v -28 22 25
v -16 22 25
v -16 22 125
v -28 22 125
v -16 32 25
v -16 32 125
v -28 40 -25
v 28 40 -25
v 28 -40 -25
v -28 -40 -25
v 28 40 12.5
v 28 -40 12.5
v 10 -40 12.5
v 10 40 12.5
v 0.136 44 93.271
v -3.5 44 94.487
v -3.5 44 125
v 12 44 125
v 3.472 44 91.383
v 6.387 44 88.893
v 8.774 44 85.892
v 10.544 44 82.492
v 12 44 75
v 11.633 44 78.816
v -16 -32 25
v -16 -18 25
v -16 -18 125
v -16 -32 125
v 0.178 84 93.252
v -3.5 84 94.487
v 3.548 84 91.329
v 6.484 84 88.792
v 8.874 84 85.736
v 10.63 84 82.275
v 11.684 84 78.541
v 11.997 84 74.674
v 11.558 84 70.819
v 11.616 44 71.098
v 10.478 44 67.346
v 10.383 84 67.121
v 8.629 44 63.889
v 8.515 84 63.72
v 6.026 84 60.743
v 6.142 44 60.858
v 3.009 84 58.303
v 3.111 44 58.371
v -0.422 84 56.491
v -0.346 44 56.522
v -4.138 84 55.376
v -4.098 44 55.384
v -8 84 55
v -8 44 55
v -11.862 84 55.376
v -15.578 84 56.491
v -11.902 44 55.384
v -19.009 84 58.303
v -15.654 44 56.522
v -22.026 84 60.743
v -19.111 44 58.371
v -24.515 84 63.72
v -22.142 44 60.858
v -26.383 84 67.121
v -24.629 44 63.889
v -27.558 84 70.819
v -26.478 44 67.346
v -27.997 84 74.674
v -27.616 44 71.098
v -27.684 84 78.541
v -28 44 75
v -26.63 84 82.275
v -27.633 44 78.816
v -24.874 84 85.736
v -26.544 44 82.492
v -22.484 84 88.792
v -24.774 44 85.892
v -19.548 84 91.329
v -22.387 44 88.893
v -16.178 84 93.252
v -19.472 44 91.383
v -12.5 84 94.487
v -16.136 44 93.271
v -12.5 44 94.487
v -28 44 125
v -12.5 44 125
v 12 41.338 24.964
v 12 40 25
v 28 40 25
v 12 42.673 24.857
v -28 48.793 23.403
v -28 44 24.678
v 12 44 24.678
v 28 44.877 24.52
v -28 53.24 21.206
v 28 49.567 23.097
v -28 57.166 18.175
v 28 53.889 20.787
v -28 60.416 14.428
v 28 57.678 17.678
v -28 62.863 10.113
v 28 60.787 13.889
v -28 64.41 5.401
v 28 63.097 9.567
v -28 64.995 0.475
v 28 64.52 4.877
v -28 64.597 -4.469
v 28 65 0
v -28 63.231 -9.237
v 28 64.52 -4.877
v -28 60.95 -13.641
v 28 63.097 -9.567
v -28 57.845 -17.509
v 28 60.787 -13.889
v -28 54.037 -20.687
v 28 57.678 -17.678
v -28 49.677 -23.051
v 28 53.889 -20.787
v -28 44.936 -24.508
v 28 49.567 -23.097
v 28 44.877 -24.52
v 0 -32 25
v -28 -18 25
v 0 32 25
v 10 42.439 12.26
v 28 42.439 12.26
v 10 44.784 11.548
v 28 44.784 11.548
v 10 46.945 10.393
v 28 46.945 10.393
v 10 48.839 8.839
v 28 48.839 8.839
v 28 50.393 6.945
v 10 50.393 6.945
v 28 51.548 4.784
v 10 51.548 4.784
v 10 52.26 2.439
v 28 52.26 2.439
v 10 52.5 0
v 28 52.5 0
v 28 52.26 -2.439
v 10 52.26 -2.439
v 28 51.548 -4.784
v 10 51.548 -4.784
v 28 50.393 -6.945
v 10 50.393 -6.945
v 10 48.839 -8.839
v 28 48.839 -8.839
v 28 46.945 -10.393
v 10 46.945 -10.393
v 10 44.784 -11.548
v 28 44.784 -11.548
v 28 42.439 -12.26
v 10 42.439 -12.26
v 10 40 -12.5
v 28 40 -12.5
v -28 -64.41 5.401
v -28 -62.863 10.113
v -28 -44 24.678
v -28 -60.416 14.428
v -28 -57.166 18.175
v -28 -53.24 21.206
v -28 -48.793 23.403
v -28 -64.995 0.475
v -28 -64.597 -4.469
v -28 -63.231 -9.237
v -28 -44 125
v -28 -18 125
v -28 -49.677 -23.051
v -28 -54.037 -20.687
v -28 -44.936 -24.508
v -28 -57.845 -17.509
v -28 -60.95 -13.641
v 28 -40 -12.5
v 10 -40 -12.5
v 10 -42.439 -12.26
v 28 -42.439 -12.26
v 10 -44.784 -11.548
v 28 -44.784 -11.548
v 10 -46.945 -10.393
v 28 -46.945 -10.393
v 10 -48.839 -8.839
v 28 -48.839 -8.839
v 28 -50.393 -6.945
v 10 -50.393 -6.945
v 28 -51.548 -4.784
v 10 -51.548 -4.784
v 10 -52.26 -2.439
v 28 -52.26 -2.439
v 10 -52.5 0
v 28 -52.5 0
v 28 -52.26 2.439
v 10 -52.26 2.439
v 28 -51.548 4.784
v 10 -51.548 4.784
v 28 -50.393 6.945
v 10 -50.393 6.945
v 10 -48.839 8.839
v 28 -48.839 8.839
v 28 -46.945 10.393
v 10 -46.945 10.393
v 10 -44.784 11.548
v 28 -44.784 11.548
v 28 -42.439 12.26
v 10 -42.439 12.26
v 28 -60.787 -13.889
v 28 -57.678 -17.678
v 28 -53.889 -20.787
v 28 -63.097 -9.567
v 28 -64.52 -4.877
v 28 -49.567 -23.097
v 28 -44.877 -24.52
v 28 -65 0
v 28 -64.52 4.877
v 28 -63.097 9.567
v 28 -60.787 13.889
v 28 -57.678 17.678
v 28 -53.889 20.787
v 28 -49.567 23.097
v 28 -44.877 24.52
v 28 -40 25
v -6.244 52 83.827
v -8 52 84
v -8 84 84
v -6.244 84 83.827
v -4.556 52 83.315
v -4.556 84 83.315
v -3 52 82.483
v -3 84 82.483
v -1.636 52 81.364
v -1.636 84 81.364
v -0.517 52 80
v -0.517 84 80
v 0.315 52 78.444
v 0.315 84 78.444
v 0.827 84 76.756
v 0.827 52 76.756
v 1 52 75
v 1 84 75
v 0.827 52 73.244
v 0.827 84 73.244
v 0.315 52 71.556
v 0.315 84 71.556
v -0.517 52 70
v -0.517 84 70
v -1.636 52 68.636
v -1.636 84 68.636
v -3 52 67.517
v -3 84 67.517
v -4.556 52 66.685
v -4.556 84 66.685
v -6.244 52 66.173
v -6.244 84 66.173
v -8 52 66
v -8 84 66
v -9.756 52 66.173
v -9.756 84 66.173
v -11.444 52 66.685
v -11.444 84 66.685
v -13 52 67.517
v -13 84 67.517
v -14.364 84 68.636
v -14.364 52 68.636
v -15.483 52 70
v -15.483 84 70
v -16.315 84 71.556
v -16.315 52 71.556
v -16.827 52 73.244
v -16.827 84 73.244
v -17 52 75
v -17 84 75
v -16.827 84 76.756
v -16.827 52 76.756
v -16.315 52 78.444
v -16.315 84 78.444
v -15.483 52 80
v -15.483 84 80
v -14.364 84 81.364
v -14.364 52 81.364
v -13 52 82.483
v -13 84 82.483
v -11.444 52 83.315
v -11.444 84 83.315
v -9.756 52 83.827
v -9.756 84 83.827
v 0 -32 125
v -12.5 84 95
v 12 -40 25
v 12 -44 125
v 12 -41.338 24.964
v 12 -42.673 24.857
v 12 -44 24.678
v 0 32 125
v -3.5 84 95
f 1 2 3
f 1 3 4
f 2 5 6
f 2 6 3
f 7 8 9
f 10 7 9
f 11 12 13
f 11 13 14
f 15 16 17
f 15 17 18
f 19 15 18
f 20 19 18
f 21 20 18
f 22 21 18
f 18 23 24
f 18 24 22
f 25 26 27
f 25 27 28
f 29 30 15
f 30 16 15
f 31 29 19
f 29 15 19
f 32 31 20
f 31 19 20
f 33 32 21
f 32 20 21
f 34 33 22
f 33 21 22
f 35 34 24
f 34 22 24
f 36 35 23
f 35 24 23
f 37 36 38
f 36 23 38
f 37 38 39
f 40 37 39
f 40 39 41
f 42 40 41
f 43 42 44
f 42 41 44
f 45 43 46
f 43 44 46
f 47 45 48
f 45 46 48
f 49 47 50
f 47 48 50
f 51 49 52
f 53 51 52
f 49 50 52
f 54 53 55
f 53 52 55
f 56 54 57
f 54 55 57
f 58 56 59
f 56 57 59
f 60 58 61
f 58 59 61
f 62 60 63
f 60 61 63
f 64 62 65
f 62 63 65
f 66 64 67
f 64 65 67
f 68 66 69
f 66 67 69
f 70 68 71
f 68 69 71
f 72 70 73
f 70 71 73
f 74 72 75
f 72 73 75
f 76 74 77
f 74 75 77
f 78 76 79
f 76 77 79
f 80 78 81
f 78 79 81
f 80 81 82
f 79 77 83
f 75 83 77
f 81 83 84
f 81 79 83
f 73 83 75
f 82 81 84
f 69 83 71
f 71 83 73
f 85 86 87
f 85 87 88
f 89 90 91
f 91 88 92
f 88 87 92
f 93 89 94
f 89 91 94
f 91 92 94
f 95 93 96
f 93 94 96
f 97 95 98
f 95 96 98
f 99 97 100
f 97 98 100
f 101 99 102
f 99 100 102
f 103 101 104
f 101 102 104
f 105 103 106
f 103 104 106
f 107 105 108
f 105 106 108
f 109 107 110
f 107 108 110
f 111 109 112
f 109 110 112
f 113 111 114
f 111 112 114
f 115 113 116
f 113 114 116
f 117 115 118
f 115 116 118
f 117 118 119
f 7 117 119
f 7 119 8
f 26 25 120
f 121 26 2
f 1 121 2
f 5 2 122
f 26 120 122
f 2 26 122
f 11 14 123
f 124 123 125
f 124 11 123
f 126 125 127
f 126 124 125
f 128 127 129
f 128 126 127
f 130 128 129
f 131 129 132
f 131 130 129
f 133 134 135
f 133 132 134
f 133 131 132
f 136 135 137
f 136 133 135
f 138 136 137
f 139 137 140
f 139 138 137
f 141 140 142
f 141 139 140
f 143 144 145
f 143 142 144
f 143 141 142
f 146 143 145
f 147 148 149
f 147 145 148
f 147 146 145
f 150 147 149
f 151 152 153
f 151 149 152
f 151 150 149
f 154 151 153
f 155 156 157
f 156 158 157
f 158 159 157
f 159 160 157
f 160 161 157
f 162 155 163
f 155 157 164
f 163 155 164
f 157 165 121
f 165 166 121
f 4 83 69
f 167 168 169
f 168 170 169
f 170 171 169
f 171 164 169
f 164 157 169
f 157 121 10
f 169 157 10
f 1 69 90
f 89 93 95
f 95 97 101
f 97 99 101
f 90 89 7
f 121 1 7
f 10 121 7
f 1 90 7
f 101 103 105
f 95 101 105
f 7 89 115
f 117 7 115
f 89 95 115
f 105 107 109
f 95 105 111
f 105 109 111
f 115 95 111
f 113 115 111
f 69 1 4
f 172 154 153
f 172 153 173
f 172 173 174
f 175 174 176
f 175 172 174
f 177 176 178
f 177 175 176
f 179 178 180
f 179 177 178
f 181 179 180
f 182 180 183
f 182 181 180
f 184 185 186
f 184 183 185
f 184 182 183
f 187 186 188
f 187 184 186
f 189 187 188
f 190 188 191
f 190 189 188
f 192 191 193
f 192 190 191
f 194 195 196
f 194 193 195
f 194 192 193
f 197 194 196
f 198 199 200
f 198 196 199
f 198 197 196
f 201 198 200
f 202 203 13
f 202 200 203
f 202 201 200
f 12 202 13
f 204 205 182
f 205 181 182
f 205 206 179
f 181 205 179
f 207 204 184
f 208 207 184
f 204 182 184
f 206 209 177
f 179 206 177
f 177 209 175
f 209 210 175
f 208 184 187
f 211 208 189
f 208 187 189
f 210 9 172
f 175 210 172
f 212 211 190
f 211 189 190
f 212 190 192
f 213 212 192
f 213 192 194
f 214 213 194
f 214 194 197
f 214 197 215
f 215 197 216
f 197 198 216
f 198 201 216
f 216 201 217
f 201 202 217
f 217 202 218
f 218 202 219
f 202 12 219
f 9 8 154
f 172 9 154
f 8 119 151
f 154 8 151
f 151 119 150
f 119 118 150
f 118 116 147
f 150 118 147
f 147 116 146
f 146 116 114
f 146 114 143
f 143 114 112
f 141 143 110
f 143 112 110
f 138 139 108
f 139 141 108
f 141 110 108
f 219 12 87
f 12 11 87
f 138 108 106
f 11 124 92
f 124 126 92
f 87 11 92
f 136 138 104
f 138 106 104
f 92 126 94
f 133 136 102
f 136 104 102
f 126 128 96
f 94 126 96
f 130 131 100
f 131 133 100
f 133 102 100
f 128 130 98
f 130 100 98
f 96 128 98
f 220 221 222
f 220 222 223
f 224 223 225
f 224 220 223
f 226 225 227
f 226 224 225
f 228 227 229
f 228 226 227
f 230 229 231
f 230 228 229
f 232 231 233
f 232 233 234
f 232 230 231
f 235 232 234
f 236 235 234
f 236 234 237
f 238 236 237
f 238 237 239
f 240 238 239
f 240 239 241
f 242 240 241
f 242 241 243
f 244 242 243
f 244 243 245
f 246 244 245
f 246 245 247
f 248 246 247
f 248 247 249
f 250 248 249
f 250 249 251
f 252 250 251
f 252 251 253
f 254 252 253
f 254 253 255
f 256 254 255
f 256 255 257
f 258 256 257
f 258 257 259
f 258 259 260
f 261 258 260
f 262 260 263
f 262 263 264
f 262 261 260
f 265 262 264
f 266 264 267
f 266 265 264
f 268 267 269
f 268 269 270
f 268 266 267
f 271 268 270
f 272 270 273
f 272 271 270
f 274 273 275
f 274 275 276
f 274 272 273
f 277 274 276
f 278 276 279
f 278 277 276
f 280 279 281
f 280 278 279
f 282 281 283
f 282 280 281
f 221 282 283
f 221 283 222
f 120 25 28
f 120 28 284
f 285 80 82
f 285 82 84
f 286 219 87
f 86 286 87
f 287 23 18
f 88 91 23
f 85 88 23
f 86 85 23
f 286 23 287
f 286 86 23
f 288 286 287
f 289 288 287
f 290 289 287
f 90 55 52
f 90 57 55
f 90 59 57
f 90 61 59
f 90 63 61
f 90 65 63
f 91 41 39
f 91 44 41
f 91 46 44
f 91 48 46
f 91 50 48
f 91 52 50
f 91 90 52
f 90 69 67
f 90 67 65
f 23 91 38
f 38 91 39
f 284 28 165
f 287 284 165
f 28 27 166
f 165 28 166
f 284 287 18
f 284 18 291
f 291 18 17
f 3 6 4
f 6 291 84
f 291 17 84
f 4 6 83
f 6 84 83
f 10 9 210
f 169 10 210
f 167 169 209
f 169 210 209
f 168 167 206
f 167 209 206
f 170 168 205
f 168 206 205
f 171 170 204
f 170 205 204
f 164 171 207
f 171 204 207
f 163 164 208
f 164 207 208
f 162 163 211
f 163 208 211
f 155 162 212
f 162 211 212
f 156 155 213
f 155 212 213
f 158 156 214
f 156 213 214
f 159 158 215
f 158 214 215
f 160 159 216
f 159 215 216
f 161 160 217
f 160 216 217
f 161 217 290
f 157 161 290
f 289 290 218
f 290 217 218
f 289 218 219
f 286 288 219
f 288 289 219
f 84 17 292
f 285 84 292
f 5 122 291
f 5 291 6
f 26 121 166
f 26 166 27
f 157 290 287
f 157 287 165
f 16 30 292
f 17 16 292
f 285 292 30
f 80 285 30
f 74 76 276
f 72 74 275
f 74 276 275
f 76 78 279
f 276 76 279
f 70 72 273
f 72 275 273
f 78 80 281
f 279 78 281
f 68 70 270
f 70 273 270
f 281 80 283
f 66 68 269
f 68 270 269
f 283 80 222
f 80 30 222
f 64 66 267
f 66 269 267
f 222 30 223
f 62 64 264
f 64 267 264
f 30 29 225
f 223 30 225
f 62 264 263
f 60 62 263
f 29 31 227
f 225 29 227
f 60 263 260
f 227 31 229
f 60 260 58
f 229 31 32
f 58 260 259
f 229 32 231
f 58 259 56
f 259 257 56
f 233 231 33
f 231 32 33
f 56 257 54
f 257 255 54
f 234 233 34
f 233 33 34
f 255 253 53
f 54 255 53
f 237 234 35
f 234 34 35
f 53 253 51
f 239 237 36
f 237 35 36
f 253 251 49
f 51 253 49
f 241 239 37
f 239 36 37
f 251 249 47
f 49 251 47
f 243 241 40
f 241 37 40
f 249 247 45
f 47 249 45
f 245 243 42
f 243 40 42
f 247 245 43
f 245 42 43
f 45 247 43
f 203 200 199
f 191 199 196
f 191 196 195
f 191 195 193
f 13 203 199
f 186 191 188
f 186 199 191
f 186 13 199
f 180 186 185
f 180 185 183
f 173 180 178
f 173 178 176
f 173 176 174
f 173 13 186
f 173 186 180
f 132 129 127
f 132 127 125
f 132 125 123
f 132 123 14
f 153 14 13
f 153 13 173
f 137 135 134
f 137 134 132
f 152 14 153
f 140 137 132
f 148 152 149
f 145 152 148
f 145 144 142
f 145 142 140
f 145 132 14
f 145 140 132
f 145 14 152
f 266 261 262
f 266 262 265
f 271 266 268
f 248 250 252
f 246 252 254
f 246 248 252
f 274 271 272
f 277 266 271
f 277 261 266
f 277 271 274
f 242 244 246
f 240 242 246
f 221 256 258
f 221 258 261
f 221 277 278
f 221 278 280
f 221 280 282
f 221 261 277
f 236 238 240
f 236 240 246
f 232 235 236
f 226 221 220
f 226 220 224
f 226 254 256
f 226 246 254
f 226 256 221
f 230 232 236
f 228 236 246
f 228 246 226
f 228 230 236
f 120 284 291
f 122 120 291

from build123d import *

# Parameters (mm, degrees)
BOSS_EXTRUDE1_DEPTH      = 28
BOSS_EXTRUDE2_DEPTH      = 10
BOSS_EXTRUDE2_DEPTH_BACK = 28
BOSS_EXTRUDE3_DEPTH      = 100
BOSS_EXTRUDE3_DEPTH_BACK = 4
SKETCH4_R                = 20
SKETCH4_R_2              = 9
BOSS_EXTRUDE4_DEPTH      = 40
SKETCH4_2_R              = 9
BOSS_EXTRUDE5_DEPTH      = 8
RIB2_START               = -4.5
RIB2_DEPTH               = 9


with BuildPart() as part:
    # Sketch1 → Boss-Extrude1 (new, symmetric)
    with BuildSketch(Plane(origin=(0, 0, 0), x_dir=(0, 0, -1), z_dir=(1, 0, 0))):
        with BuildLine():
            Line((25, 40), (25, -40))
            ThreePointArc((25, -40), (0, -65), (-25, -40))
            Line((-25, -40), (-25, 40))
            ThreePointArc((-25, 40), (0, 65), (25, 40))
        make_face()
        with BuildLine():
            Line((12.5, 40), (12.5, -40))
            ThreePointArc((12.5, -40), (0, -52.5), (-12.5, -40))
            Line((-12.5, -40), (-12.5, 40))
            ThreePointArc((-12.5, 40), (0, 52.5), (12.5, 40))
        make_face(mode=Mode.SUBTRACT)
    extrude(amount=BOSS_EXTRUDE1_DEPTH, both=True)

    # Sketch1<2> → Boss-Extrude2 (add, two sides: drawn at the far end of the back side and taken through both)
    with BuildSketch(Plane(origin=(0, 0, 0), x_dir=(0, 0, -1), z_dir=(1, 0, 0)).offset(-BOSS_EXTRUDE2_DEPTH_BACK)):
        with BuildLine():
            Line((-12.5, 40), (-12.5, -40))
            ThreePointArc((-12.5, -40), (0, -52.5), (12.5, -40))
            Line((12.5, -40), (12.5, 40))
            ThreePointArc((12.5, 40), (0, 52.5), (-12.5, 40))
        make_face()
    extrude(amount=BOSS_EXTRUDE2_DEPTH + BOSS_EXTRUDE2_DEPTH_BACK)

    # Sketch3 → Boss-Extrude3 (add, two sides: drawn at the far end of the back side and taken through both)
    with BuildSketch(Plane.XY.offset(25).offset(-BOSS_EXTRUDE3_DEPTH_BACK)):
        Polygon((-28, 44), (12, 44), (12, -44), (-28, -44), (-28, -18), (-16, -18), (-16, -32), (0, -32), (0, 32), (-16, 32), (-16, 22), (-28, 22), align=None)
    extrude(amount=BOSS_EXTRUDE3_DEPTH + BOSS_EXTRUDE3_DEPTH_BACK)

    # Sketch4 → Boss-Extrude4 (add)
    with BuildSketch(Plane(origin=(0, 44, 0), x_dir=(1, 0, 0), z_dir=(0, 1, 0))):
        with Locations(Location((-8, -75, 0), (0, 0, 180))):
            Circle(SKETCH4_R)
        with Locations(Location((-8, -75, 0), (0, 0, 270))):
            Circle(SKETCH4_R_2, mode=Mode.SUBTRACT)
    extrude(amount=BOSS_EXTRUDE4_DEPTH)

    # Sketch4<2> → Boss-Extrude5 (add)
    with BuildSketch(Plane(origin=(0, 44, 0), x_dir=(1, 0, 0), z_dir=(0, 1, 0))):
        with Locations(Location((-8, -75, 0), (0, 0, 270))):
            Circle(SKETCH4_2_R)
    extrude(amount=BOSS_EXTRUDE5_DEPTH)

    # Rib2: read off the stored shape, not the designer's step
    # Rib2 outline → Rib2 (add)
    with BuildSketch(Plane.ZY.offset(8).offset(RIB2_START)):
        Polygon((95, 84), (94.48717527, 84), (94.48717527, 44), (125, 44), align=None)
    extrude(amount=RIB2_DEPTH)


solid = part.part
